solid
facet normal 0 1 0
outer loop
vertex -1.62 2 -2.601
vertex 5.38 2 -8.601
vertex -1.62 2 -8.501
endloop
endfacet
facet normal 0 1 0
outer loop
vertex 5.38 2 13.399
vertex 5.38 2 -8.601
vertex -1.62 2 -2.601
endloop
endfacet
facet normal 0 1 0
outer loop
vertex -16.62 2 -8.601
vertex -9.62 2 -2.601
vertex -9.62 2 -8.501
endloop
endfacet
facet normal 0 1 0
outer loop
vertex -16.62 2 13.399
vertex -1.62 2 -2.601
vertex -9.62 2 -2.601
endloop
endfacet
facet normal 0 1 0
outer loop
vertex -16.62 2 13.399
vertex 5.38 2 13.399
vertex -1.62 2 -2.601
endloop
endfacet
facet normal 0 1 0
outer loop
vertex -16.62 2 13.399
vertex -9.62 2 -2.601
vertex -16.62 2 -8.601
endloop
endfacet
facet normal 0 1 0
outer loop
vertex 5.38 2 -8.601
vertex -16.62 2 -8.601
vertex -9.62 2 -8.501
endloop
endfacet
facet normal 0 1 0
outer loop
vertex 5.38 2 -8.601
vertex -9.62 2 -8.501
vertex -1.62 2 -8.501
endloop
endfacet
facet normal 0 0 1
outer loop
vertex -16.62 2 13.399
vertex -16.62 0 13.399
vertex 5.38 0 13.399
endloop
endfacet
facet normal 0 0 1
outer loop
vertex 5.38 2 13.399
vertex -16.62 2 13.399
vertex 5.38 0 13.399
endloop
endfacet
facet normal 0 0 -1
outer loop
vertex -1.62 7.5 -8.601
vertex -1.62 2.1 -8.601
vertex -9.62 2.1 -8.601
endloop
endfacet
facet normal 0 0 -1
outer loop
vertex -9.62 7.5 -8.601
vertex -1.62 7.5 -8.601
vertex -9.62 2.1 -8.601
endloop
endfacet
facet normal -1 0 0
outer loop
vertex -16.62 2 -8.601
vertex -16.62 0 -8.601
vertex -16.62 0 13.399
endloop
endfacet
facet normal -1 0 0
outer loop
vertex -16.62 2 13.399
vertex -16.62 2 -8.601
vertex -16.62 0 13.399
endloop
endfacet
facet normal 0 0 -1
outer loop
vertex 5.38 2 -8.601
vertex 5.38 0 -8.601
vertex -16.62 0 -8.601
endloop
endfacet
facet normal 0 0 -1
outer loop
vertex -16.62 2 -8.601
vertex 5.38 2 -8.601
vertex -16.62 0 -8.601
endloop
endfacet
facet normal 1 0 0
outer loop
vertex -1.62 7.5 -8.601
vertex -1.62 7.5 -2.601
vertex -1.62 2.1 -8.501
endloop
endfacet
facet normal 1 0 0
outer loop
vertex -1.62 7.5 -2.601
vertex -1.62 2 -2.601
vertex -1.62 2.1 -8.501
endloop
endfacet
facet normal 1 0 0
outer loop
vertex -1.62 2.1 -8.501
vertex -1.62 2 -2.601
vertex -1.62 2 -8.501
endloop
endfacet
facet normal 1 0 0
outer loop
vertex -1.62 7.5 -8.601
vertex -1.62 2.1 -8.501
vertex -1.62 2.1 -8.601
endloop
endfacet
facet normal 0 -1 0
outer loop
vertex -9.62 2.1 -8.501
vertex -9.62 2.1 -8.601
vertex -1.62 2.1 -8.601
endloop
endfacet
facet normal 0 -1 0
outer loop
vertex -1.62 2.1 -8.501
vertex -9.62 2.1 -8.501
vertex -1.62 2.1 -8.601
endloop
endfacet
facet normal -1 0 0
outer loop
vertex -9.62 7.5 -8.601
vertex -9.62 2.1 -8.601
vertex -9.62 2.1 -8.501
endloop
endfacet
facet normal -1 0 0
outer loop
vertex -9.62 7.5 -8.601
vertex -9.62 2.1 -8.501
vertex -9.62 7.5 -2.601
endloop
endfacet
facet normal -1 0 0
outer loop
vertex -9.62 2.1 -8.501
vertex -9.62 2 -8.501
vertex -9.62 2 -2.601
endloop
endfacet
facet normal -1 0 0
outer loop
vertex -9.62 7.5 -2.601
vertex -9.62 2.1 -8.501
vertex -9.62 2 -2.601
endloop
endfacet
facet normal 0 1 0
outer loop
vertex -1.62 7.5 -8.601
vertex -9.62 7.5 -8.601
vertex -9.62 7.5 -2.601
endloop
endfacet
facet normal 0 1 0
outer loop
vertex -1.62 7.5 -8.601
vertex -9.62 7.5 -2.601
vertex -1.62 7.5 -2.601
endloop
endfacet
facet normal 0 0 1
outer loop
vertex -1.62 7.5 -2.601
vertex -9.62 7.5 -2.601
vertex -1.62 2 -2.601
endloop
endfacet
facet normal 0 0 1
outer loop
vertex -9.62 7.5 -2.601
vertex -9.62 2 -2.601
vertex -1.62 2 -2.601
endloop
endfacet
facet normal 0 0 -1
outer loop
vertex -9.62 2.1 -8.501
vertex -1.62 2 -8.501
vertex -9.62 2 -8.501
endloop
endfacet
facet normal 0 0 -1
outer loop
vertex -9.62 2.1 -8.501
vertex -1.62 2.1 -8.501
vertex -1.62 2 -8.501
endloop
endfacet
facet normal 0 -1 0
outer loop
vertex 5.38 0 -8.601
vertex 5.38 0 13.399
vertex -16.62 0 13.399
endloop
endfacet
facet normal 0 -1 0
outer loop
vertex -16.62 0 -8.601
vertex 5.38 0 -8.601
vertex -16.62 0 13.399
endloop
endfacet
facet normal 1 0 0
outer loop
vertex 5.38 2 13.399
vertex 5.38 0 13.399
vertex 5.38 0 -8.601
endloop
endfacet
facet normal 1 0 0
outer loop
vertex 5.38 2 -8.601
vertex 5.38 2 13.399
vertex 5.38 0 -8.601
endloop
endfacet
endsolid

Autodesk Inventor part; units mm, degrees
ref_plane "YZ Plane" through (0, 0, 0) normal (1, 0, 0) x (0, 1, 0)
ref_plane "XZ Plane" through (0, 0, 0) normal (0, 1, 0) x (-1, 0, 0)
ref_plane "XY Plane" through (0, 0, 0) normal (0, 0, 1) x (1, 0, 0)
sketch "Sketch1" plane through (0, 0, 0) normal (0, 1, 0) x (-1, 0, 0)
  line L0 (16.6199, 13.3988) -> (-5.3801, 13.3988)
  line L1 (-5.3801, 13.3988) -> (-5.3801, -8.6012)
  line L2 (-5.3801, -8.6012) -> (16.6199, -8.6012)
  line L3 (16.6199, -8.6012) -> (16.6199, 13.3988)
  point P0 (0, 0)
  dimension "d0" = 22
  dimension "d1" = 22
extrude "Extrusion1" add sketch "Sketch1" along normal blind 2
sketch "Sketch2" plane through (0, 2, 0) normal (0, 1, 0) x (1, 0, 0)
  line L0 (5.3801, 8.6012) -> (-16.6199, 8.6012) projected
  line L1 (-1.6199, 8.6012) -> (-9.6199, 8.6012)
  line L2 (-9.6199, 8.6012) -> (-9.6199, 2.6012)
  line L3 (-9.6199, 2.6012) -> (-1.6199, 2.6012)
  line L4 (-1.6199, 2.6012) -> (-1.6199, 8.6012)
  line L5 (-16.6199, 8.6012) -> (-16.6199, -13.3988) projected
  line L6 (5.3801, -13.3988) -> (5.3801, 8.6012) projected
  point P0 (0, 0)
  dimension "d4" = 8
  dimension "d5" = 7
  dimension "d6" = 7
  dimension "d7" = 6
extrude "Extrusion2" add sketch "Sketch2" along normal blind 5.5
sketch "Sketch3" plane through (5.3801, 0, -8.6012) normal (0, 0, -1) x (-1, 0, 0)
  line L0 (7, 2) -> (15, 2) projected
  line L1 (15, 2) -> (15, 7.5) projected
  line L2 (7, 2) -> (15, 2)
  line L3 (15, 2) -> (15, 2.1)
  line L4 (15, 2.1) -> (7, 2.1)
  line L5 (7, 2.1) -> (7, 2)
  point P0 (5.3801, 0)
  dimension "d10" = 0.1
extrude "Extrusion3" cut sketch "Sketch3" against normal blind 0.1
properties part number "battery connector"
